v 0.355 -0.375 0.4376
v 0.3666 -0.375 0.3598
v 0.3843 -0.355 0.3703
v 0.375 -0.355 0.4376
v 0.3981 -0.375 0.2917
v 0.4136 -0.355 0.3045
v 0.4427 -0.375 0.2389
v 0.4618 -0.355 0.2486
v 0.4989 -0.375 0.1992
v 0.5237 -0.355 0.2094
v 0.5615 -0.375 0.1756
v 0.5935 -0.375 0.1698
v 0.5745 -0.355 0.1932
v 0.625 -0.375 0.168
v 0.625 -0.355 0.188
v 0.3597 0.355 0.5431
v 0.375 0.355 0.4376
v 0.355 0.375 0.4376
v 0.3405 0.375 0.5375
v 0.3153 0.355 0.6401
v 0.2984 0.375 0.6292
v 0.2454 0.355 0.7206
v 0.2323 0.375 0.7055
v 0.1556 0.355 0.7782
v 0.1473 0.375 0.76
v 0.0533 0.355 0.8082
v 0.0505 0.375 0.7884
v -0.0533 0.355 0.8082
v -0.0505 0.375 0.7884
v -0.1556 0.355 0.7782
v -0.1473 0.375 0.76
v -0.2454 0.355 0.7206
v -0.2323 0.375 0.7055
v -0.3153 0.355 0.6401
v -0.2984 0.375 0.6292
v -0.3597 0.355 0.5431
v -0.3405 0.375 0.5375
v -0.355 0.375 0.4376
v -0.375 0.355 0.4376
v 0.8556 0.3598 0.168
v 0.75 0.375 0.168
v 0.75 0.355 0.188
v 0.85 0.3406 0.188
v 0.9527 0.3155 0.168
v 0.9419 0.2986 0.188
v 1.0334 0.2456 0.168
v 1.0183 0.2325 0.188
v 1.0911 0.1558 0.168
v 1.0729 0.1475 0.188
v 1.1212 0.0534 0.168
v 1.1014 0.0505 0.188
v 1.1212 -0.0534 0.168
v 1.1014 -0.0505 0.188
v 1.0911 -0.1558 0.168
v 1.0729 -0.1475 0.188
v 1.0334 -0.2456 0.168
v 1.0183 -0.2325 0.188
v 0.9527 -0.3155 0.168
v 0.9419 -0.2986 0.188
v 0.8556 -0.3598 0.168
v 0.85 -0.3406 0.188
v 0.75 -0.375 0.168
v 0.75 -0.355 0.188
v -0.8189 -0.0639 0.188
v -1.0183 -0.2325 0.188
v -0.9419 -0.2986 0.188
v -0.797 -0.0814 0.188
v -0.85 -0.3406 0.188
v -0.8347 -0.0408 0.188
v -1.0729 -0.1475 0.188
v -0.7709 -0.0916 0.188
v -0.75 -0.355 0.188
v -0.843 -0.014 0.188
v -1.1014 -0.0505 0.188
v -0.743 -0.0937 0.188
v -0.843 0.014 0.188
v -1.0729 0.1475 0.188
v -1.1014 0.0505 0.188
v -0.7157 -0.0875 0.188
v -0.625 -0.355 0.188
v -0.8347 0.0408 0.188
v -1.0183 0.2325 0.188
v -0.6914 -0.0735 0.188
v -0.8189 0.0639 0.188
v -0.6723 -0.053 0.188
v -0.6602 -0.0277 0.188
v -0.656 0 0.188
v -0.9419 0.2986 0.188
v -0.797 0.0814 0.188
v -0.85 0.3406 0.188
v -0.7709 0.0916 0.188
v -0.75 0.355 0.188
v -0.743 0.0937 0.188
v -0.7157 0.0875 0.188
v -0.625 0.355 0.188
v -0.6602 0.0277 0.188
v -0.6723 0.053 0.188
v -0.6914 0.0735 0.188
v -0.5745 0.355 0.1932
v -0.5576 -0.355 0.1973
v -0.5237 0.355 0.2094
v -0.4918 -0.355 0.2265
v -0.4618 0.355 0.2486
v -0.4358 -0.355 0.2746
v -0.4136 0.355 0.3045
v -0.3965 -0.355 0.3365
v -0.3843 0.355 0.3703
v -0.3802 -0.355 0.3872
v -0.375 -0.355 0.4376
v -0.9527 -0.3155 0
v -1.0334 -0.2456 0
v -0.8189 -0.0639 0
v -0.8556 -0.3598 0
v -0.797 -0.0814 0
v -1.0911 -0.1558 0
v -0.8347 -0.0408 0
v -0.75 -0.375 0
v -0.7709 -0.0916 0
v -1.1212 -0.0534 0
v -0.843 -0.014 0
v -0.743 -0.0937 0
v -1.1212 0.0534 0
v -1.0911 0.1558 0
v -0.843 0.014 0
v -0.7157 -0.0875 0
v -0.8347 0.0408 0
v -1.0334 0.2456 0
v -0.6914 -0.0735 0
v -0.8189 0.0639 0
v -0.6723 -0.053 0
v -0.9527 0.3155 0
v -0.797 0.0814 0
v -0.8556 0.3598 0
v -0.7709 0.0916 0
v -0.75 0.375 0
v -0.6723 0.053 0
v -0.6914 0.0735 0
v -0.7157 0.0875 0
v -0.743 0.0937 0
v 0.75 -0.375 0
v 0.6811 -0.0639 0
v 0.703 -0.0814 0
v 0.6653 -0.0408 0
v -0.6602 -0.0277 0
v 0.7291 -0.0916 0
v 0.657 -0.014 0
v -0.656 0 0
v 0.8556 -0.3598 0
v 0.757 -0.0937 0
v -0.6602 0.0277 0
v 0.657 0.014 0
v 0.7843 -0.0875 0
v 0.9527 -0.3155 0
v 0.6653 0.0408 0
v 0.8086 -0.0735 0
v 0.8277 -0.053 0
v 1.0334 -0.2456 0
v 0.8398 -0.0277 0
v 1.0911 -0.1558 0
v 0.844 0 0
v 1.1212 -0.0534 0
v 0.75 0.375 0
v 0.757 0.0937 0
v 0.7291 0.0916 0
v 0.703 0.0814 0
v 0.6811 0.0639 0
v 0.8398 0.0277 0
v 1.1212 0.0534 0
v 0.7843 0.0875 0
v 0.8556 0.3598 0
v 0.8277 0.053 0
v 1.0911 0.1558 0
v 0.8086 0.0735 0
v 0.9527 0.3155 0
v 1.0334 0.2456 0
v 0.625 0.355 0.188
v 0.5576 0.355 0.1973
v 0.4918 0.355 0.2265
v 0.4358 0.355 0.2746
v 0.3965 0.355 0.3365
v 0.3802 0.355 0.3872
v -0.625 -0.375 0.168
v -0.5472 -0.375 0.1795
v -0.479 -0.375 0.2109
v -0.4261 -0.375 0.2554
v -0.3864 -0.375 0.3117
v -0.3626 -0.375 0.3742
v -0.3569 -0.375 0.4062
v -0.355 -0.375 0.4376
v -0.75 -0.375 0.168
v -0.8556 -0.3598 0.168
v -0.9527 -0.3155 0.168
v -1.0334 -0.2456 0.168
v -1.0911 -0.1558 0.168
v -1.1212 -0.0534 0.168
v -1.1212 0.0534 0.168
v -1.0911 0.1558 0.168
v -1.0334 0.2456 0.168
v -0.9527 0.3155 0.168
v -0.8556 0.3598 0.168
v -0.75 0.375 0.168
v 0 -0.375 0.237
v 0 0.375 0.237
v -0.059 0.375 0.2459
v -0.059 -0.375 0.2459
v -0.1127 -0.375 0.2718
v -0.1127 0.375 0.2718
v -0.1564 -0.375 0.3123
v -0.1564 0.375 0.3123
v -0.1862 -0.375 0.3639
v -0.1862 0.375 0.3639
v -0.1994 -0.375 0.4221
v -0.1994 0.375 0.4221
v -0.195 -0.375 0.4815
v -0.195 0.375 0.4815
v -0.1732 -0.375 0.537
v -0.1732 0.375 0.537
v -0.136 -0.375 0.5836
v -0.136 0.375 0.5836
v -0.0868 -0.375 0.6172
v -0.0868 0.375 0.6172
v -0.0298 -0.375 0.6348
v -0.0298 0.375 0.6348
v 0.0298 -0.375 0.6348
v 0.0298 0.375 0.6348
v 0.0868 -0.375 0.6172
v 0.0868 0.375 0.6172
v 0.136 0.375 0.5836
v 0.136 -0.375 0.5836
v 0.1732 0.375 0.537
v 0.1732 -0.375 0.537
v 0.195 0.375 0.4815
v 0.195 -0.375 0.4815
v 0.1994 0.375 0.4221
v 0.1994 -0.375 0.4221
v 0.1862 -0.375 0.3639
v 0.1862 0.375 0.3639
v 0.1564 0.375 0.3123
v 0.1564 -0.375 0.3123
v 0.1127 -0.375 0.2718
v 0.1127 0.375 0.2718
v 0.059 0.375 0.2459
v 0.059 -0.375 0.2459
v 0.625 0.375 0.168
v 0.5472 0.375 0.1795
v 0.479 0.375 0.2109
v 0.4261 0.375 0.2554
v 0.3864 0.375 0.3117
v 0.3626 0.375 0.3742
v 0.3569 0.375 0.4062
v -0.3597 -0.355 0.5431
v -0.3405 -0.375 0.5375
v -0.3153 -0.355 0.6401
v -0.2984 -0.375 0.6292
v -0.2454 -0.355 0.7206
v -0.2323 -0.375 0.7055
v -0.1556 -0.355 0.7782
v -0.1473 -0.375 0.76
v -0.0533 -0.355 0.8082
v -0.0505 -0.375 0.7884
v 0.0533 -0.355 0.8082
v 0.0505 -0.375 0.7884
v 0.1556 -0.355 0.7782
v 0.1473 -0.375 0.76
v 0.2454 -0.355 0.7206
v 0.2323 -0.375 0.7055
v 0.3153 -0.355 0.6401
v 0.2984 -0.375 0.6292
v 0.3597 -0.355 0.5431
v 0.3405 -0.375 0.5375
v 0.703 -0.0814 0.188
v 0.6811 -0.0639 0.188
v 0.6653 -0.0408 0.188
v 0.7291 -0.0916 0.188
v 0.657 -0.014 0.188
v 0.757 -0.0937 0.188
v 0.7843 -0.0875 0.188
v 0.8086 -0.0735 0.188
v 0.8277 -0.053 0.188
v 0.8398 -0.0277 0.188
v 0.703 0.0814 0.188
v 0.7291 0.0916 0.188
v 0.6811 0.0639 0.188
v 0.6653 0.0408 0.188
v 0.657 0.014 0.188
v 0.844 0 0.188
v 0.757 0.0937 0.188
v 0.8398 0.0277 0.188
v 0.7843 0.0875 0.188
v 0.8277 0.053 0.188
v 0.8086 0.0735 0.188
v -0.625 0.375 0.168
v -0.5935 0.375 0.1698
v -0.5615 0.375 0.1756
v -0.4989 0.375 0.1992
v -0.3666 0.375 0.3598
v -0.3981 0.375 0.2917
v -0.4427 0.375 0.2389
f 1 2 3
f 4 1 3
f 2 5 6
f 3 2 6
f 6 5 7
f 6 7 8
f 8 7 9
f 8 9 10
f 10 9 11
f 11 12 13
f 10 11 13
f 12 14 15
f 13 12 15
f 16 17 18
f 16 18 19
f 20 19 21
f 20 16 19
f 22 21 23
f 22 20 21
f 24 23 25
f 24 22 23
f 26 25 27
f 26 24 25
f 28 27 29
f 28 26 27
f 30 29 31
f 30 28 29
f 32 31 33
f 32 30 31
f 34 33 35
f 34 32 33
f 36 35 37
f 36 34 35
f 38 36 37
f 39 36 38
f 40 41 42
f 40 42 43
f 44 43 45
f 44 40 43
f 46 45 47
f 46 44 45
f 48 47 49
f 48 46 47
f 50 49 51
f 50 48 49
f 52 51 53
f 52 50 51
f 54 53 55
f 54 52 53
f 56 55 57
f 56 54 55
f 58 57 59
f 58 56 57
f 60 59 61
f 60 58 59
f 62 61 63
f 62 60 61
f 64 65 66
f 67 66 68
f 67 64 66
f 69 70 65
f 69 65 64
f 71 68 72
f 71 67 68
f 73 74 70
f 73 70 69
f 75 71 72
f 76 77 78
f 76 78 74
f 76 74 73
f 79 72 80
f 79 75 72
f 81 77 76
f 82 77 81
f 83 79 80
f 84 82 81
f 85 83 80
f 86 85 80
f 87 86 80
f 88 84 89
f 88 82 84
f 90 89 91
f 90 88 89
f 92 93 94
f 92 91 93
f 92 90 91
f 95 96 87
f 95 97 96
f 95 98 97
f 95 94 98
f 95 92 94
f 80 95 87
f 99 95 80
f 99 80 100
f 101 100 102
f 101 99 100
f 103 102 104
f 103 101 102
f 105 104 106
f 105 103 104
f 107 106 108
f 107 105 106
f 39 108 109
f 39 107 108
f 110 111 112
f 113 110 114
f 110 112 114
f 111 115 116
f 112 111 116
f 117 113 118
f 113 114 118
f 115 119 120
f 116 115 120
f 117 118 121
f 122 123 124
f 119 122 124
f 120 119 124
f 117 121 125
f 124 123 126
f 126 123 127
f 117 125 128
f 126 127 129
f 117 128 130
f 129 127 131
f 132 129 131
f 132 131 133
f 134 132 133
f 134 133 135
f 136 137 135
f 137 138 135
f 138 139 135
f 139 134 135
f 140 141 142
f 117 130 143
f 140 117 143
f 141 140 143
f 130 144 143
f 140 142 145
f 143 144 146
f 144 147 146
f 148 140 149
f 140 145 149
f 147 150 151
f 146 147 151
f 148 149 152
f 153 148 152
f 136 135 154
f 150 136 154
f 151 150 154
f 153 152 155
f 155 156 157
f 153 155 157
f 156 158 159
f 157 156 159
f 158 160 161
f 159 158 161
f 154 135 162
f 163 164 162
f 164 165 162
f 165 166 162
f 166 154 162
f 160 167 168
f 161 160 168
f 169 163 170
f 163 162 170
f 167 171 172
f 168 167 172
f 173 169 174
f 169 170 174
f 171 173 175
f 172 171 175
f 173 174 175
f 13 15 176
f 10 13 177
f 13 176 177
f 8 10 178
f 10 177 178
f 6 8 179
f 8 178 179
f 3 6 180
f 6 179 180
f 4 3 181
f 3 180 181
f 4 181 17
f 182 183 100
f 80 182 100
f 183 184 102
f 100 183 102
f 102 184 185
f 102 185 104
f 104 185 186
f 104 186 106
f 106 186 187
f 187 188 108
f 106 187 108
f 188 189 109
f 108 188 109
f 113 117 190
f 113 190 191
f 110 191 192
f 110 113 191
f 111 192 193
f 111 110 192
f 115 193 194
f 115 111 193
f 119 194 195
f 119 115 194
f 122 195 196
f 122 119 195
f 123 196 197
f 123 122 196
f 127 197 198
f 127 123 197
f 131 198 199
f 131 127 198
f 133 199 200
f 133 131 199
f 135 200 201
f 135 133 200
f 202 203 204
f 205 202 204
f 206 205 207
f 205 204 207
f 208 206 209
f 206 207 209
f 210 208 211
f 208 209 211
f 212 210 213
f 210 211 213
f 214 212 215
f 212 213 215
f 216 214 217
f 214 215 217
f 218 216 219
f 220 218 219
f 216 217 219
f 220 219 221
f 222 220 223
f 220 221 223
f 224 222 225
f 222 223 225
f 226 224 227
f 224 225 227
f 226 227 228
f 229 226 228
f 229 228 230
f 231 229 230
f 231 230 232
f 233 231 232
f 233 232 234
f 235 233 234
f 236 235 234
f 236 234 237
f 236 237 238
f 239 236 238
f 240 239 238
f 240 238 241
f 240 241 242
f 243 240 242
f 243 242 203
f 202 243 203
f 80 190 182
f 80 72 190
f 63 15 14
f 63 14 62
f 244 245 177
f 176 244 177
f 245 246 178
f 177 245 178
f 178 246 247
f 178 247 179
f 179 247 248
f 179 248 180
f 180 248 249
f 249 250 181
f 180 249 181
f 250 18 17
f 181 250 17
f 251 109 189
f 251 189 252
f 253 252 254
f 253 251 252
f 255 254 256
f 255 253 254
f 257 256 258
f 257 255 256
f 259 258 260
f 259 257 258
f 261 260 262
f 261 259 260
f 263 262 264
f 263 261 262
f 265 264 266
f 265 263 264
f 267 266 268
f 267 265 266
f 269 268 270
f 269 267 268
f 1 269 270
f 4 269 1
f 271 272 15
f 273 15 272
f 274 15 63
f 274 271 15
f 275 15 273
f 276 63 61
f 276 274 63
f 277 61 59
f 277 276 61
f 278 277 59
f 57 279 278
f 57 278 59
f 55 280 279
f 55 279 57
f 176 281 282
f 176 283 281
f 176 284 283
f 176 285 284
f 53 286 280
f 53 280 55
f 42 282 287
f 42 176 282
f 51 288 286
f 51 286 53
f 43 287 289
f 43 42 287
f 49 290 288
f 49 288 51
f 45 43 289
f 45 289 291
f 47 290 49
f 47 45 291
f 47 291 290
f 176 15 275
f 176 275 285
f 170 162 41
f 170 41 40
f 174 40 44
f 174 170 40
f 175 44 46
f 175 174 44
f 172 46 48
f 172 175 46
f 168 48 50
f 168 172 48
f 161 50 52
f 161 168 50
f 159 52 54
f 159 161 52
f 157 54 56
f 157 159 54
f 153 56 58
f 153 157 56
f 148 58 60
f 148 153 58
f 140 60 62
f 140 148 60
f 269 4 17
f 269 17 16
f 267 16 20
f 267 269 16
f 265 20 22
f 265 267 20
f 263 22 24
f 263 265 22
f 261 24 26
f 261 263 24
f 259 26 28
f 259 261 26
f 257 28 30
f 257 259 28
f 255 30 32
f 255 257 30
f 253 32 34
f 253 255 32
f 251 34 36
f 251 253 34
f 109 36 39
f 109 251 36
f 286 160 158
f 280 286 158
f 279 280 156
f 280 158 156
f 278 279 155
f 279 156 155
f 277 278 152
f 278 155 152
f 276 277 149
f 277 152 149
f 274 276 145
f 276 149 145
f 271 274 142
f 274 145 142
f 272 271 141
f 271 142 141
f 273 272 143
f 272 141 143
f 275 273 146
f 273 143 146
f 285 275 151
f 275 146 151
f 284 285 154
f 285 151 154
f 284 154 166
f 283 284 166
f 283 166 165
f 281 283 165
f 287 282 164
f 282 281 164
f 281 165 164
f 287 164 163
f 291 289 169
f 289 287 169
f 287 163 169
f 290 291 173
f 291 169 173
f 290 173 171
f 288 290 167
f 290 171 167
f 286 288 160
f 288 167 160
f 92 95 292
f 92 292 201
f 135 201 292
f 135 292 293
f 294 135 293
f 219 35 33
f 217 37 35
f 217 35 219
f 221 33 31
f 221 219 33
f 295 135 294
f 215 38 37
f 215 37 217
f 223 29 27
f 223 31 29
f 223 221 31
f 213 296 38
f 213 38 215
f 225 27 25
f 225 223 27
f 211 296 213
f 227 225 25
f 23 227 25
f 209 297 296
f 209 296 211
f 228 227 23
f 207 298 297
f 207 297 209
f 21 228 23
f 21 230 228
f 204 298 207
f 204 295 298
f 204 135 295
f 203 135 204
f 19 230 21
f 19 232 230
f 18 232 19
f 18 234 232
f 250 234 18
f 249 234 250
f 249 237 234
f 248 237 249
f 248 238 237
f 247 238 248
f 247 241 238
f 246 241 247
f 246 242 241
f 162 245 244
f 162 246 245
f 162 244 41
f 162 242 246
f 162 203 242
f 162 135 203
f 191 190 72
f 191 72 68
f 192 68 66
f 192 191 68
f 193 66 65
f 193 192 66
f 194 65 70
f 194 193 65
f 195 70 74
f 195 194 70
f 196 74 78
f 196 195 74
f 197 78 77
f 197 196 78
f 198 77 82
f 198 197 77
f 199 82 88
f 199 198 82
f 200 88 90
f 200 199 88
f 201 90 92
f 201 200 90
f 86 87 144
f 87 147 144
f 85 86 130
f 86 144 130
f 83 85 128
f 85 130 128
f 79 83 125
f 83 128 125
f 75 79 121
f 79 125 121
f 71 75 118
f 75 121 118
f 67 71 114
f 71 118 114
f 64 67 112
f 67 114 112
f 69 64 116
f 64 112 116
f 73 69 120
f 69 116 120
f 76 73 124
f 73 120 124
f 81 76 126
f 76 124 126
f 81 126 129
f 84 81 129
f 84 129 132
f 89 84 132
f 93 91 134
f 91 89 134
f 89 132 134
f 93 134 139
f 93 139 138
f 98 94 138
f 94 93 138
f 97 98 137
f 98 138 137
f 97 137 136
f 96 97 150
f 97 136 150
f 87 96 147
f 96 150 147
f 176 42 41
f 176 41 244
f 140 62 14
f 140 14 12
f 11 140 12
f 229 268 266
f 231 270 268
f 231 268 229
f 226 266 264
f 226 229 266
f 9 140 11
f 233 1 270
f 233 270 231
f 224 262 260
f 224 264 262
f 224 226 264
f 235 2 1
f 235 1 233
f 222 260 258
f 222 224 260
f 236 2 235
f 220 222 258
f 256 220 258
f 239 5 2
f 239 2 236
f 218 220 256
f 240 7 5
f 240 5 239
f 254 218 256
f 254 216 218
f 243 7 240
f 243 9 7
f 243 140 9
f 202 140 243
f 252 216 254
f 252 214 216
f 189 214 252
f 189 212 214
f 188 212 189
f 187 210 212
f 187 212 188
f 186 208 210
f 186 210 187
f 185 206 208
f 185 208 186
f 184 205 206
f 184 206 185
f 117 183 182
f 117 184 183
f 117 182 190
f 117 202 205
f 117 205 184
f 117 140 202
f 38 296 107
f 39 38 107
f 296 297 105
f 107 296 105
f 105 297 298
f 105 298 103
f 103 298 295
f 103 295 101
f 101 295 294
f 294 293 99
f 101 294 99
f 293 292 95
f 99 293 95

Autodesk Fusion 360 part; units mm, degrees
sketch "Sketch1" plane through (0, 0, 0) normal (0, 0, 1) x (1, 0, 0)
  line L0 (0.75, -0.375) -> (-0.75, -0.375)
  line L1 (-0.75, -0.375) -> (-0.75, 0.375) construction
  line L2 (-0.75, 0.375) -> (0.75, 0.375)
  line L3 (0.75, 0.375) -> (0.75, -0.375) construction
  line L4 (0.75, -0.375) -> (-0.75, 0.375) construction
  line L5 (-0.75, -0.375) -> (0.75, 0.375) construction
  arc A0 (-0.75, 0.375) -> (-0.75, -0.375) centre (-0.75, 0) ccw
  arc A1 (0.75, -0.375) -> (0.75, 0.375) centre (0.75, 0) ccw
  circle A2 centre (-0.75, 0) radius 0.094
  circle A3 centre (0.75, 0) radius 0.094
  dimension "d1" = 1.5
  dimension "d2" = 0.75
  dimension "d3" = 0.188
extrude "Extrude1" add sketch "Sketch1" along normal blind 0.188
sketch "Sketch2" plane through (0, -0.375, 0) normal (0, -1, 0) x (1, 0, 0)
  line L0 (-0.75, 0) -> (0.75, 0)
  line L1 (0.75, 0) -> (0.75, 0.188)
  line L2 (0.75, 0.188) -> (-0.75, 0.188)
  line L3 (-0.75, 0.188) -> (-0.75, 0)
  line L4 (0, 0) -> (0, 0.837) construction
  line L5 (-0.375, 0.437) -> (-0.375, 0.188)
  line L6 (0.375, 0.437) -> (0.375, 0.188)
  arc A0 (0.375, 0.437) -> (-0.375, 0.437) centre (0, 0.437) ccw
  dimension "d6" = 0.75
  dimension "d7" = 0.437
extrude "Extrude2" add sketch "Sketch2" against normal up to surface (0.75 mm away) contours L2 L5 L6 A0
hole "Hole1" at (0, -0.375, 0.437) direction (0, 1, 0) diameter 0.4 end through all
fillet "Fillet1" radius 0.25 2 edges at (0.375, 0, 0.188) (-0.375, 0, 0.188)
chamfer "Chamfer1" distance 0.02 angle 45 12 edges at (-0.4486, -0.375, 0.2609) (-0.6875, -0.375, 0.188) (-1.125, 0, 0.188) (-0.6875, 0.375, 0.188) (-0.4486, 0.375, 0.2609) (0, 0.375, 0.812) (0.4486, 0.375, 0.2609) (0.6875, 0.375, 0.188) (1.125, 0, 0.188) (0.6875, -0.375, 0.188) (0.4486, -0.375, 0.2609) (0, -0.375, 0.812)
